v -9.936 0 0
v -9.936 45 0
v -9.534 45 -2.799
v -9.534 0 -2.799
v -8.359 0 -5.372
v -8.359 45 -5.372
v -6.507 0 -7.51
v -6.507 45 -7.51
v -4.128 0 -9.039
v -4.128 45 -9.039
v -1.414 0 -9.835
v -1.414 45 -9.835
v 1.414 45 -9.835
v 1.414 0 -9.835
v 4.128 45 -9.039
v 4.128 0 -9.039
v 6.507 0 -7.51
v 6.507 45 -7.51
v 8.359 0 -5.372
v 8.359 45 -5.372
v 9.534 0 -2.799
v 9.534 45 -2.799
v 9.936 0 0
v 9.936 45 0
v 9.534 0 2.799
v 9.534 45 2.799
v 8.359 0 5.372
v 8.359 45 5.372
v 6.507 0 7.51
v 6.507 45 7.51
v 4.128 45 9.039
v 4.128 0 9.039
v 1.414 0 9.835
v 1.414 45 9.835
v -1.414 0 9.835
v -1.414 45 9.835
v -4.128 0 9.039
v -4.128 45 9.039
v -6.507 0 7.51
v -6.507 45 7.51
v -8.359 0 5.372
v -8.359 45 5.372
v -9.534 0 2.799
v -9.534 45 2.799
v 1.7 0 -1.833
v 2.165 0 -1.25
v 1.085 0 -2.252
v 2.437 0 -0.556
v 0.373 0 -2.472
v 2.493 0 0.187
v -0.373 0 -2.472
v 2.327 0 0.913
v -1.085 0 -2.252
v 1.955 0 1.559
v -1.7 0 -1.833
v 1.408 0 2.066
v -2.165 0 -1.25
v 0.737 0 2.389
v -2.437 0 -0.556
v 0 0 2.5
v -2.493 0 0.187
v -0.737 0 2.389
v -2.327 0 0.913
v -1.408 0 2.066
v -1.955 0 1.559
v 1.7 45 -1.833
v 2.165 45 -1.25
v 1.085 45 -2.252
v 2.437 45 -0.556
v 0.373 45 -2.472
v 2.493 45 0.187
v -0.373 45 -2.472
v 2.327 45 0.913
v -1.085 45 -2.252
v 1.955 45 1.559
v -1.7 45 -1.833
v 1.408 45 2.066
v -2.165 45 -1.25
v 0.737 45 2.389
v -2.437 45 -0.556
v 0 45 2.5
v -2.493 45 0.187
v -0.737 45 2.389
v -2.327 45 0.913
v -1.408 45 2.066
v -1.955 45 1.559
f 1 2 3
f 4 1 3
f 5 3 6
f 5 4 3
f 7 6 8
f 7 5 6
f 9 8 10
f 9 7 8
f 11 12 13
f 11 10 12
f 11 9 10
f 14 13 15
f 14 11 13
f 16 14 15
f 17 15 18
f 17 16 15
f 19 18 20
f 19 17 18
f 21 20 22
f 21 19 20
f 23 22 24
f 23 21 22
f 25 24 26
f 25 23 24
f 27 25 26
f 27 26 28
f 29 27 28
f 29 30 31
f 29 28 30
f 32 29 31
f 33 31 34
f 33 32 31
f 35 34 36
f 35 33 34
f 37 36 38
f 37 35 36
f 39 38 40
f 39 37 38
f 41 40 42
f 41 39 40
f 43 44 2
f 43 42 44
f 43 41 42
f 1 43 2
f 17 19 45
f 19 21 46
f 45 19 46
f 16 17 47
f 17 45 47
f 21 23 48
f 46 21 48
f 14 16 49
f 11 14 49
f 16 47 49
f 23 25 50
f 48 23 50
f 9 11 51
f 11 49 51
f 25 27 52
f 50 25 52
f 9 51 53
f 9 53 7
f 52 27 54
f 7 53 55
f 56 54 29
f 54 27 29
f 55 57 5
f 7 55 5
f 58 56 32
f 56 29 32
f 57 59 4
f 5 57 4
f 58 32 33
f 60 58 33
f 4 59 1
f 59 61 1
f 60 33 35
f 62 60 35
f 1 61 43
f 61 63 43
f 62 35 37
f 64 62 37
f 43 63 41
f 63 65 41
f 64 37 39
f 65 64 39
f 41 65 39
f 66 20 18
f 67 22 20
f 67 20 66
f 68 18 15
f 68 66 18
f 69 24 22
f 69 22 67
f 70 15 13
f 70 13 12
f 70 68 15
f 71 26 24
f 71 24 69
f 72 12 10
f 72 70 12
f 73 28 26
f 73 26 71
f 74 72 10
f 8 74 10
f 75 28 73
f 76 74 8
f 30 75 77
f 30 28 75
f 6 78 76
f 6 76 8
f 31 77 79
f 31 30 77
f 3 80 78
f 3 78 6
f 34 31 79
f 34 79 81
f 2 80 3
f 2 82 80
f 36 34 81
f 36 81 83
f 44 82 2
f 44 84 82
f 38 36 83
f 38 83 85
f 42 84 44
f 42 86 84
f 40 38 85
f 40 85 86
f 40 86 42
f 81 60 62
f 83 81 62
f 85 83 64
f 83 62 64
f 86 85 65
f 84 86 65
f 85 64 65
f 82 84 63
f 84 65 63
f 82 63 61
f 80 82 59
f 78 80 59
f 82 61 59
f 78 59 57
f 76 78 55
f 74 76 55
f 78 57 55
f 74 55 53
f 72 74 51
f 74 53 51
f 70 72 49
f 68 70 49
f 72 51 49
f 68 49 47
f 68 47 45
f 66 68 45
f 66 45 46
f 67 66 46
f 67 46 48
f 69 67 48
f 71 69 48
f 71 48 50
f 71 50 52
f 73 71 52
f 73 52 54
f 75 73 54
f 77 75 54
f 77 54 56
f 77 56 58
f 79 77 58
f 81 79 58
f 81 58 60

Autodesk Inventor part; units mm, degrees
ref_plane "YZ Plane" through (0, 0, 0) normal (1, 0, 0) x (0, 1, 0)
ref_plane "XZ Plane" through (0, 0, 0) normal (0, 1, 0) x (-1, 0, 0)
ref_plane "XY Plane" through (0, 0, 0) normal (0, 0, 1) x (1, 0, 0)
sketch "Boceto1" plane through (0, 0, 0) normal (0, 1, 0) x (-1, 0, 0)
  circle A0 centre (0, 0) radius 9.9365
extrude "Extrusión1" add sketch "Boceto1" along normal blind 30
extrude "Extrusión2" cut sketch "Boceto1" along normal blind 30
extrude "Extrusión3" add sketch "Boceto1" along normal blind 45
sketch "Boceto2" plane through (0, 45, 0) normal (0, 1, 0) x (1, 0, 0)
  point P0 (0, 0)
hole "Agujero1" at (0, 45, 0) direction (0, -1, 0) diameter 5 end through all
properties part number "pieza base de bobina"
